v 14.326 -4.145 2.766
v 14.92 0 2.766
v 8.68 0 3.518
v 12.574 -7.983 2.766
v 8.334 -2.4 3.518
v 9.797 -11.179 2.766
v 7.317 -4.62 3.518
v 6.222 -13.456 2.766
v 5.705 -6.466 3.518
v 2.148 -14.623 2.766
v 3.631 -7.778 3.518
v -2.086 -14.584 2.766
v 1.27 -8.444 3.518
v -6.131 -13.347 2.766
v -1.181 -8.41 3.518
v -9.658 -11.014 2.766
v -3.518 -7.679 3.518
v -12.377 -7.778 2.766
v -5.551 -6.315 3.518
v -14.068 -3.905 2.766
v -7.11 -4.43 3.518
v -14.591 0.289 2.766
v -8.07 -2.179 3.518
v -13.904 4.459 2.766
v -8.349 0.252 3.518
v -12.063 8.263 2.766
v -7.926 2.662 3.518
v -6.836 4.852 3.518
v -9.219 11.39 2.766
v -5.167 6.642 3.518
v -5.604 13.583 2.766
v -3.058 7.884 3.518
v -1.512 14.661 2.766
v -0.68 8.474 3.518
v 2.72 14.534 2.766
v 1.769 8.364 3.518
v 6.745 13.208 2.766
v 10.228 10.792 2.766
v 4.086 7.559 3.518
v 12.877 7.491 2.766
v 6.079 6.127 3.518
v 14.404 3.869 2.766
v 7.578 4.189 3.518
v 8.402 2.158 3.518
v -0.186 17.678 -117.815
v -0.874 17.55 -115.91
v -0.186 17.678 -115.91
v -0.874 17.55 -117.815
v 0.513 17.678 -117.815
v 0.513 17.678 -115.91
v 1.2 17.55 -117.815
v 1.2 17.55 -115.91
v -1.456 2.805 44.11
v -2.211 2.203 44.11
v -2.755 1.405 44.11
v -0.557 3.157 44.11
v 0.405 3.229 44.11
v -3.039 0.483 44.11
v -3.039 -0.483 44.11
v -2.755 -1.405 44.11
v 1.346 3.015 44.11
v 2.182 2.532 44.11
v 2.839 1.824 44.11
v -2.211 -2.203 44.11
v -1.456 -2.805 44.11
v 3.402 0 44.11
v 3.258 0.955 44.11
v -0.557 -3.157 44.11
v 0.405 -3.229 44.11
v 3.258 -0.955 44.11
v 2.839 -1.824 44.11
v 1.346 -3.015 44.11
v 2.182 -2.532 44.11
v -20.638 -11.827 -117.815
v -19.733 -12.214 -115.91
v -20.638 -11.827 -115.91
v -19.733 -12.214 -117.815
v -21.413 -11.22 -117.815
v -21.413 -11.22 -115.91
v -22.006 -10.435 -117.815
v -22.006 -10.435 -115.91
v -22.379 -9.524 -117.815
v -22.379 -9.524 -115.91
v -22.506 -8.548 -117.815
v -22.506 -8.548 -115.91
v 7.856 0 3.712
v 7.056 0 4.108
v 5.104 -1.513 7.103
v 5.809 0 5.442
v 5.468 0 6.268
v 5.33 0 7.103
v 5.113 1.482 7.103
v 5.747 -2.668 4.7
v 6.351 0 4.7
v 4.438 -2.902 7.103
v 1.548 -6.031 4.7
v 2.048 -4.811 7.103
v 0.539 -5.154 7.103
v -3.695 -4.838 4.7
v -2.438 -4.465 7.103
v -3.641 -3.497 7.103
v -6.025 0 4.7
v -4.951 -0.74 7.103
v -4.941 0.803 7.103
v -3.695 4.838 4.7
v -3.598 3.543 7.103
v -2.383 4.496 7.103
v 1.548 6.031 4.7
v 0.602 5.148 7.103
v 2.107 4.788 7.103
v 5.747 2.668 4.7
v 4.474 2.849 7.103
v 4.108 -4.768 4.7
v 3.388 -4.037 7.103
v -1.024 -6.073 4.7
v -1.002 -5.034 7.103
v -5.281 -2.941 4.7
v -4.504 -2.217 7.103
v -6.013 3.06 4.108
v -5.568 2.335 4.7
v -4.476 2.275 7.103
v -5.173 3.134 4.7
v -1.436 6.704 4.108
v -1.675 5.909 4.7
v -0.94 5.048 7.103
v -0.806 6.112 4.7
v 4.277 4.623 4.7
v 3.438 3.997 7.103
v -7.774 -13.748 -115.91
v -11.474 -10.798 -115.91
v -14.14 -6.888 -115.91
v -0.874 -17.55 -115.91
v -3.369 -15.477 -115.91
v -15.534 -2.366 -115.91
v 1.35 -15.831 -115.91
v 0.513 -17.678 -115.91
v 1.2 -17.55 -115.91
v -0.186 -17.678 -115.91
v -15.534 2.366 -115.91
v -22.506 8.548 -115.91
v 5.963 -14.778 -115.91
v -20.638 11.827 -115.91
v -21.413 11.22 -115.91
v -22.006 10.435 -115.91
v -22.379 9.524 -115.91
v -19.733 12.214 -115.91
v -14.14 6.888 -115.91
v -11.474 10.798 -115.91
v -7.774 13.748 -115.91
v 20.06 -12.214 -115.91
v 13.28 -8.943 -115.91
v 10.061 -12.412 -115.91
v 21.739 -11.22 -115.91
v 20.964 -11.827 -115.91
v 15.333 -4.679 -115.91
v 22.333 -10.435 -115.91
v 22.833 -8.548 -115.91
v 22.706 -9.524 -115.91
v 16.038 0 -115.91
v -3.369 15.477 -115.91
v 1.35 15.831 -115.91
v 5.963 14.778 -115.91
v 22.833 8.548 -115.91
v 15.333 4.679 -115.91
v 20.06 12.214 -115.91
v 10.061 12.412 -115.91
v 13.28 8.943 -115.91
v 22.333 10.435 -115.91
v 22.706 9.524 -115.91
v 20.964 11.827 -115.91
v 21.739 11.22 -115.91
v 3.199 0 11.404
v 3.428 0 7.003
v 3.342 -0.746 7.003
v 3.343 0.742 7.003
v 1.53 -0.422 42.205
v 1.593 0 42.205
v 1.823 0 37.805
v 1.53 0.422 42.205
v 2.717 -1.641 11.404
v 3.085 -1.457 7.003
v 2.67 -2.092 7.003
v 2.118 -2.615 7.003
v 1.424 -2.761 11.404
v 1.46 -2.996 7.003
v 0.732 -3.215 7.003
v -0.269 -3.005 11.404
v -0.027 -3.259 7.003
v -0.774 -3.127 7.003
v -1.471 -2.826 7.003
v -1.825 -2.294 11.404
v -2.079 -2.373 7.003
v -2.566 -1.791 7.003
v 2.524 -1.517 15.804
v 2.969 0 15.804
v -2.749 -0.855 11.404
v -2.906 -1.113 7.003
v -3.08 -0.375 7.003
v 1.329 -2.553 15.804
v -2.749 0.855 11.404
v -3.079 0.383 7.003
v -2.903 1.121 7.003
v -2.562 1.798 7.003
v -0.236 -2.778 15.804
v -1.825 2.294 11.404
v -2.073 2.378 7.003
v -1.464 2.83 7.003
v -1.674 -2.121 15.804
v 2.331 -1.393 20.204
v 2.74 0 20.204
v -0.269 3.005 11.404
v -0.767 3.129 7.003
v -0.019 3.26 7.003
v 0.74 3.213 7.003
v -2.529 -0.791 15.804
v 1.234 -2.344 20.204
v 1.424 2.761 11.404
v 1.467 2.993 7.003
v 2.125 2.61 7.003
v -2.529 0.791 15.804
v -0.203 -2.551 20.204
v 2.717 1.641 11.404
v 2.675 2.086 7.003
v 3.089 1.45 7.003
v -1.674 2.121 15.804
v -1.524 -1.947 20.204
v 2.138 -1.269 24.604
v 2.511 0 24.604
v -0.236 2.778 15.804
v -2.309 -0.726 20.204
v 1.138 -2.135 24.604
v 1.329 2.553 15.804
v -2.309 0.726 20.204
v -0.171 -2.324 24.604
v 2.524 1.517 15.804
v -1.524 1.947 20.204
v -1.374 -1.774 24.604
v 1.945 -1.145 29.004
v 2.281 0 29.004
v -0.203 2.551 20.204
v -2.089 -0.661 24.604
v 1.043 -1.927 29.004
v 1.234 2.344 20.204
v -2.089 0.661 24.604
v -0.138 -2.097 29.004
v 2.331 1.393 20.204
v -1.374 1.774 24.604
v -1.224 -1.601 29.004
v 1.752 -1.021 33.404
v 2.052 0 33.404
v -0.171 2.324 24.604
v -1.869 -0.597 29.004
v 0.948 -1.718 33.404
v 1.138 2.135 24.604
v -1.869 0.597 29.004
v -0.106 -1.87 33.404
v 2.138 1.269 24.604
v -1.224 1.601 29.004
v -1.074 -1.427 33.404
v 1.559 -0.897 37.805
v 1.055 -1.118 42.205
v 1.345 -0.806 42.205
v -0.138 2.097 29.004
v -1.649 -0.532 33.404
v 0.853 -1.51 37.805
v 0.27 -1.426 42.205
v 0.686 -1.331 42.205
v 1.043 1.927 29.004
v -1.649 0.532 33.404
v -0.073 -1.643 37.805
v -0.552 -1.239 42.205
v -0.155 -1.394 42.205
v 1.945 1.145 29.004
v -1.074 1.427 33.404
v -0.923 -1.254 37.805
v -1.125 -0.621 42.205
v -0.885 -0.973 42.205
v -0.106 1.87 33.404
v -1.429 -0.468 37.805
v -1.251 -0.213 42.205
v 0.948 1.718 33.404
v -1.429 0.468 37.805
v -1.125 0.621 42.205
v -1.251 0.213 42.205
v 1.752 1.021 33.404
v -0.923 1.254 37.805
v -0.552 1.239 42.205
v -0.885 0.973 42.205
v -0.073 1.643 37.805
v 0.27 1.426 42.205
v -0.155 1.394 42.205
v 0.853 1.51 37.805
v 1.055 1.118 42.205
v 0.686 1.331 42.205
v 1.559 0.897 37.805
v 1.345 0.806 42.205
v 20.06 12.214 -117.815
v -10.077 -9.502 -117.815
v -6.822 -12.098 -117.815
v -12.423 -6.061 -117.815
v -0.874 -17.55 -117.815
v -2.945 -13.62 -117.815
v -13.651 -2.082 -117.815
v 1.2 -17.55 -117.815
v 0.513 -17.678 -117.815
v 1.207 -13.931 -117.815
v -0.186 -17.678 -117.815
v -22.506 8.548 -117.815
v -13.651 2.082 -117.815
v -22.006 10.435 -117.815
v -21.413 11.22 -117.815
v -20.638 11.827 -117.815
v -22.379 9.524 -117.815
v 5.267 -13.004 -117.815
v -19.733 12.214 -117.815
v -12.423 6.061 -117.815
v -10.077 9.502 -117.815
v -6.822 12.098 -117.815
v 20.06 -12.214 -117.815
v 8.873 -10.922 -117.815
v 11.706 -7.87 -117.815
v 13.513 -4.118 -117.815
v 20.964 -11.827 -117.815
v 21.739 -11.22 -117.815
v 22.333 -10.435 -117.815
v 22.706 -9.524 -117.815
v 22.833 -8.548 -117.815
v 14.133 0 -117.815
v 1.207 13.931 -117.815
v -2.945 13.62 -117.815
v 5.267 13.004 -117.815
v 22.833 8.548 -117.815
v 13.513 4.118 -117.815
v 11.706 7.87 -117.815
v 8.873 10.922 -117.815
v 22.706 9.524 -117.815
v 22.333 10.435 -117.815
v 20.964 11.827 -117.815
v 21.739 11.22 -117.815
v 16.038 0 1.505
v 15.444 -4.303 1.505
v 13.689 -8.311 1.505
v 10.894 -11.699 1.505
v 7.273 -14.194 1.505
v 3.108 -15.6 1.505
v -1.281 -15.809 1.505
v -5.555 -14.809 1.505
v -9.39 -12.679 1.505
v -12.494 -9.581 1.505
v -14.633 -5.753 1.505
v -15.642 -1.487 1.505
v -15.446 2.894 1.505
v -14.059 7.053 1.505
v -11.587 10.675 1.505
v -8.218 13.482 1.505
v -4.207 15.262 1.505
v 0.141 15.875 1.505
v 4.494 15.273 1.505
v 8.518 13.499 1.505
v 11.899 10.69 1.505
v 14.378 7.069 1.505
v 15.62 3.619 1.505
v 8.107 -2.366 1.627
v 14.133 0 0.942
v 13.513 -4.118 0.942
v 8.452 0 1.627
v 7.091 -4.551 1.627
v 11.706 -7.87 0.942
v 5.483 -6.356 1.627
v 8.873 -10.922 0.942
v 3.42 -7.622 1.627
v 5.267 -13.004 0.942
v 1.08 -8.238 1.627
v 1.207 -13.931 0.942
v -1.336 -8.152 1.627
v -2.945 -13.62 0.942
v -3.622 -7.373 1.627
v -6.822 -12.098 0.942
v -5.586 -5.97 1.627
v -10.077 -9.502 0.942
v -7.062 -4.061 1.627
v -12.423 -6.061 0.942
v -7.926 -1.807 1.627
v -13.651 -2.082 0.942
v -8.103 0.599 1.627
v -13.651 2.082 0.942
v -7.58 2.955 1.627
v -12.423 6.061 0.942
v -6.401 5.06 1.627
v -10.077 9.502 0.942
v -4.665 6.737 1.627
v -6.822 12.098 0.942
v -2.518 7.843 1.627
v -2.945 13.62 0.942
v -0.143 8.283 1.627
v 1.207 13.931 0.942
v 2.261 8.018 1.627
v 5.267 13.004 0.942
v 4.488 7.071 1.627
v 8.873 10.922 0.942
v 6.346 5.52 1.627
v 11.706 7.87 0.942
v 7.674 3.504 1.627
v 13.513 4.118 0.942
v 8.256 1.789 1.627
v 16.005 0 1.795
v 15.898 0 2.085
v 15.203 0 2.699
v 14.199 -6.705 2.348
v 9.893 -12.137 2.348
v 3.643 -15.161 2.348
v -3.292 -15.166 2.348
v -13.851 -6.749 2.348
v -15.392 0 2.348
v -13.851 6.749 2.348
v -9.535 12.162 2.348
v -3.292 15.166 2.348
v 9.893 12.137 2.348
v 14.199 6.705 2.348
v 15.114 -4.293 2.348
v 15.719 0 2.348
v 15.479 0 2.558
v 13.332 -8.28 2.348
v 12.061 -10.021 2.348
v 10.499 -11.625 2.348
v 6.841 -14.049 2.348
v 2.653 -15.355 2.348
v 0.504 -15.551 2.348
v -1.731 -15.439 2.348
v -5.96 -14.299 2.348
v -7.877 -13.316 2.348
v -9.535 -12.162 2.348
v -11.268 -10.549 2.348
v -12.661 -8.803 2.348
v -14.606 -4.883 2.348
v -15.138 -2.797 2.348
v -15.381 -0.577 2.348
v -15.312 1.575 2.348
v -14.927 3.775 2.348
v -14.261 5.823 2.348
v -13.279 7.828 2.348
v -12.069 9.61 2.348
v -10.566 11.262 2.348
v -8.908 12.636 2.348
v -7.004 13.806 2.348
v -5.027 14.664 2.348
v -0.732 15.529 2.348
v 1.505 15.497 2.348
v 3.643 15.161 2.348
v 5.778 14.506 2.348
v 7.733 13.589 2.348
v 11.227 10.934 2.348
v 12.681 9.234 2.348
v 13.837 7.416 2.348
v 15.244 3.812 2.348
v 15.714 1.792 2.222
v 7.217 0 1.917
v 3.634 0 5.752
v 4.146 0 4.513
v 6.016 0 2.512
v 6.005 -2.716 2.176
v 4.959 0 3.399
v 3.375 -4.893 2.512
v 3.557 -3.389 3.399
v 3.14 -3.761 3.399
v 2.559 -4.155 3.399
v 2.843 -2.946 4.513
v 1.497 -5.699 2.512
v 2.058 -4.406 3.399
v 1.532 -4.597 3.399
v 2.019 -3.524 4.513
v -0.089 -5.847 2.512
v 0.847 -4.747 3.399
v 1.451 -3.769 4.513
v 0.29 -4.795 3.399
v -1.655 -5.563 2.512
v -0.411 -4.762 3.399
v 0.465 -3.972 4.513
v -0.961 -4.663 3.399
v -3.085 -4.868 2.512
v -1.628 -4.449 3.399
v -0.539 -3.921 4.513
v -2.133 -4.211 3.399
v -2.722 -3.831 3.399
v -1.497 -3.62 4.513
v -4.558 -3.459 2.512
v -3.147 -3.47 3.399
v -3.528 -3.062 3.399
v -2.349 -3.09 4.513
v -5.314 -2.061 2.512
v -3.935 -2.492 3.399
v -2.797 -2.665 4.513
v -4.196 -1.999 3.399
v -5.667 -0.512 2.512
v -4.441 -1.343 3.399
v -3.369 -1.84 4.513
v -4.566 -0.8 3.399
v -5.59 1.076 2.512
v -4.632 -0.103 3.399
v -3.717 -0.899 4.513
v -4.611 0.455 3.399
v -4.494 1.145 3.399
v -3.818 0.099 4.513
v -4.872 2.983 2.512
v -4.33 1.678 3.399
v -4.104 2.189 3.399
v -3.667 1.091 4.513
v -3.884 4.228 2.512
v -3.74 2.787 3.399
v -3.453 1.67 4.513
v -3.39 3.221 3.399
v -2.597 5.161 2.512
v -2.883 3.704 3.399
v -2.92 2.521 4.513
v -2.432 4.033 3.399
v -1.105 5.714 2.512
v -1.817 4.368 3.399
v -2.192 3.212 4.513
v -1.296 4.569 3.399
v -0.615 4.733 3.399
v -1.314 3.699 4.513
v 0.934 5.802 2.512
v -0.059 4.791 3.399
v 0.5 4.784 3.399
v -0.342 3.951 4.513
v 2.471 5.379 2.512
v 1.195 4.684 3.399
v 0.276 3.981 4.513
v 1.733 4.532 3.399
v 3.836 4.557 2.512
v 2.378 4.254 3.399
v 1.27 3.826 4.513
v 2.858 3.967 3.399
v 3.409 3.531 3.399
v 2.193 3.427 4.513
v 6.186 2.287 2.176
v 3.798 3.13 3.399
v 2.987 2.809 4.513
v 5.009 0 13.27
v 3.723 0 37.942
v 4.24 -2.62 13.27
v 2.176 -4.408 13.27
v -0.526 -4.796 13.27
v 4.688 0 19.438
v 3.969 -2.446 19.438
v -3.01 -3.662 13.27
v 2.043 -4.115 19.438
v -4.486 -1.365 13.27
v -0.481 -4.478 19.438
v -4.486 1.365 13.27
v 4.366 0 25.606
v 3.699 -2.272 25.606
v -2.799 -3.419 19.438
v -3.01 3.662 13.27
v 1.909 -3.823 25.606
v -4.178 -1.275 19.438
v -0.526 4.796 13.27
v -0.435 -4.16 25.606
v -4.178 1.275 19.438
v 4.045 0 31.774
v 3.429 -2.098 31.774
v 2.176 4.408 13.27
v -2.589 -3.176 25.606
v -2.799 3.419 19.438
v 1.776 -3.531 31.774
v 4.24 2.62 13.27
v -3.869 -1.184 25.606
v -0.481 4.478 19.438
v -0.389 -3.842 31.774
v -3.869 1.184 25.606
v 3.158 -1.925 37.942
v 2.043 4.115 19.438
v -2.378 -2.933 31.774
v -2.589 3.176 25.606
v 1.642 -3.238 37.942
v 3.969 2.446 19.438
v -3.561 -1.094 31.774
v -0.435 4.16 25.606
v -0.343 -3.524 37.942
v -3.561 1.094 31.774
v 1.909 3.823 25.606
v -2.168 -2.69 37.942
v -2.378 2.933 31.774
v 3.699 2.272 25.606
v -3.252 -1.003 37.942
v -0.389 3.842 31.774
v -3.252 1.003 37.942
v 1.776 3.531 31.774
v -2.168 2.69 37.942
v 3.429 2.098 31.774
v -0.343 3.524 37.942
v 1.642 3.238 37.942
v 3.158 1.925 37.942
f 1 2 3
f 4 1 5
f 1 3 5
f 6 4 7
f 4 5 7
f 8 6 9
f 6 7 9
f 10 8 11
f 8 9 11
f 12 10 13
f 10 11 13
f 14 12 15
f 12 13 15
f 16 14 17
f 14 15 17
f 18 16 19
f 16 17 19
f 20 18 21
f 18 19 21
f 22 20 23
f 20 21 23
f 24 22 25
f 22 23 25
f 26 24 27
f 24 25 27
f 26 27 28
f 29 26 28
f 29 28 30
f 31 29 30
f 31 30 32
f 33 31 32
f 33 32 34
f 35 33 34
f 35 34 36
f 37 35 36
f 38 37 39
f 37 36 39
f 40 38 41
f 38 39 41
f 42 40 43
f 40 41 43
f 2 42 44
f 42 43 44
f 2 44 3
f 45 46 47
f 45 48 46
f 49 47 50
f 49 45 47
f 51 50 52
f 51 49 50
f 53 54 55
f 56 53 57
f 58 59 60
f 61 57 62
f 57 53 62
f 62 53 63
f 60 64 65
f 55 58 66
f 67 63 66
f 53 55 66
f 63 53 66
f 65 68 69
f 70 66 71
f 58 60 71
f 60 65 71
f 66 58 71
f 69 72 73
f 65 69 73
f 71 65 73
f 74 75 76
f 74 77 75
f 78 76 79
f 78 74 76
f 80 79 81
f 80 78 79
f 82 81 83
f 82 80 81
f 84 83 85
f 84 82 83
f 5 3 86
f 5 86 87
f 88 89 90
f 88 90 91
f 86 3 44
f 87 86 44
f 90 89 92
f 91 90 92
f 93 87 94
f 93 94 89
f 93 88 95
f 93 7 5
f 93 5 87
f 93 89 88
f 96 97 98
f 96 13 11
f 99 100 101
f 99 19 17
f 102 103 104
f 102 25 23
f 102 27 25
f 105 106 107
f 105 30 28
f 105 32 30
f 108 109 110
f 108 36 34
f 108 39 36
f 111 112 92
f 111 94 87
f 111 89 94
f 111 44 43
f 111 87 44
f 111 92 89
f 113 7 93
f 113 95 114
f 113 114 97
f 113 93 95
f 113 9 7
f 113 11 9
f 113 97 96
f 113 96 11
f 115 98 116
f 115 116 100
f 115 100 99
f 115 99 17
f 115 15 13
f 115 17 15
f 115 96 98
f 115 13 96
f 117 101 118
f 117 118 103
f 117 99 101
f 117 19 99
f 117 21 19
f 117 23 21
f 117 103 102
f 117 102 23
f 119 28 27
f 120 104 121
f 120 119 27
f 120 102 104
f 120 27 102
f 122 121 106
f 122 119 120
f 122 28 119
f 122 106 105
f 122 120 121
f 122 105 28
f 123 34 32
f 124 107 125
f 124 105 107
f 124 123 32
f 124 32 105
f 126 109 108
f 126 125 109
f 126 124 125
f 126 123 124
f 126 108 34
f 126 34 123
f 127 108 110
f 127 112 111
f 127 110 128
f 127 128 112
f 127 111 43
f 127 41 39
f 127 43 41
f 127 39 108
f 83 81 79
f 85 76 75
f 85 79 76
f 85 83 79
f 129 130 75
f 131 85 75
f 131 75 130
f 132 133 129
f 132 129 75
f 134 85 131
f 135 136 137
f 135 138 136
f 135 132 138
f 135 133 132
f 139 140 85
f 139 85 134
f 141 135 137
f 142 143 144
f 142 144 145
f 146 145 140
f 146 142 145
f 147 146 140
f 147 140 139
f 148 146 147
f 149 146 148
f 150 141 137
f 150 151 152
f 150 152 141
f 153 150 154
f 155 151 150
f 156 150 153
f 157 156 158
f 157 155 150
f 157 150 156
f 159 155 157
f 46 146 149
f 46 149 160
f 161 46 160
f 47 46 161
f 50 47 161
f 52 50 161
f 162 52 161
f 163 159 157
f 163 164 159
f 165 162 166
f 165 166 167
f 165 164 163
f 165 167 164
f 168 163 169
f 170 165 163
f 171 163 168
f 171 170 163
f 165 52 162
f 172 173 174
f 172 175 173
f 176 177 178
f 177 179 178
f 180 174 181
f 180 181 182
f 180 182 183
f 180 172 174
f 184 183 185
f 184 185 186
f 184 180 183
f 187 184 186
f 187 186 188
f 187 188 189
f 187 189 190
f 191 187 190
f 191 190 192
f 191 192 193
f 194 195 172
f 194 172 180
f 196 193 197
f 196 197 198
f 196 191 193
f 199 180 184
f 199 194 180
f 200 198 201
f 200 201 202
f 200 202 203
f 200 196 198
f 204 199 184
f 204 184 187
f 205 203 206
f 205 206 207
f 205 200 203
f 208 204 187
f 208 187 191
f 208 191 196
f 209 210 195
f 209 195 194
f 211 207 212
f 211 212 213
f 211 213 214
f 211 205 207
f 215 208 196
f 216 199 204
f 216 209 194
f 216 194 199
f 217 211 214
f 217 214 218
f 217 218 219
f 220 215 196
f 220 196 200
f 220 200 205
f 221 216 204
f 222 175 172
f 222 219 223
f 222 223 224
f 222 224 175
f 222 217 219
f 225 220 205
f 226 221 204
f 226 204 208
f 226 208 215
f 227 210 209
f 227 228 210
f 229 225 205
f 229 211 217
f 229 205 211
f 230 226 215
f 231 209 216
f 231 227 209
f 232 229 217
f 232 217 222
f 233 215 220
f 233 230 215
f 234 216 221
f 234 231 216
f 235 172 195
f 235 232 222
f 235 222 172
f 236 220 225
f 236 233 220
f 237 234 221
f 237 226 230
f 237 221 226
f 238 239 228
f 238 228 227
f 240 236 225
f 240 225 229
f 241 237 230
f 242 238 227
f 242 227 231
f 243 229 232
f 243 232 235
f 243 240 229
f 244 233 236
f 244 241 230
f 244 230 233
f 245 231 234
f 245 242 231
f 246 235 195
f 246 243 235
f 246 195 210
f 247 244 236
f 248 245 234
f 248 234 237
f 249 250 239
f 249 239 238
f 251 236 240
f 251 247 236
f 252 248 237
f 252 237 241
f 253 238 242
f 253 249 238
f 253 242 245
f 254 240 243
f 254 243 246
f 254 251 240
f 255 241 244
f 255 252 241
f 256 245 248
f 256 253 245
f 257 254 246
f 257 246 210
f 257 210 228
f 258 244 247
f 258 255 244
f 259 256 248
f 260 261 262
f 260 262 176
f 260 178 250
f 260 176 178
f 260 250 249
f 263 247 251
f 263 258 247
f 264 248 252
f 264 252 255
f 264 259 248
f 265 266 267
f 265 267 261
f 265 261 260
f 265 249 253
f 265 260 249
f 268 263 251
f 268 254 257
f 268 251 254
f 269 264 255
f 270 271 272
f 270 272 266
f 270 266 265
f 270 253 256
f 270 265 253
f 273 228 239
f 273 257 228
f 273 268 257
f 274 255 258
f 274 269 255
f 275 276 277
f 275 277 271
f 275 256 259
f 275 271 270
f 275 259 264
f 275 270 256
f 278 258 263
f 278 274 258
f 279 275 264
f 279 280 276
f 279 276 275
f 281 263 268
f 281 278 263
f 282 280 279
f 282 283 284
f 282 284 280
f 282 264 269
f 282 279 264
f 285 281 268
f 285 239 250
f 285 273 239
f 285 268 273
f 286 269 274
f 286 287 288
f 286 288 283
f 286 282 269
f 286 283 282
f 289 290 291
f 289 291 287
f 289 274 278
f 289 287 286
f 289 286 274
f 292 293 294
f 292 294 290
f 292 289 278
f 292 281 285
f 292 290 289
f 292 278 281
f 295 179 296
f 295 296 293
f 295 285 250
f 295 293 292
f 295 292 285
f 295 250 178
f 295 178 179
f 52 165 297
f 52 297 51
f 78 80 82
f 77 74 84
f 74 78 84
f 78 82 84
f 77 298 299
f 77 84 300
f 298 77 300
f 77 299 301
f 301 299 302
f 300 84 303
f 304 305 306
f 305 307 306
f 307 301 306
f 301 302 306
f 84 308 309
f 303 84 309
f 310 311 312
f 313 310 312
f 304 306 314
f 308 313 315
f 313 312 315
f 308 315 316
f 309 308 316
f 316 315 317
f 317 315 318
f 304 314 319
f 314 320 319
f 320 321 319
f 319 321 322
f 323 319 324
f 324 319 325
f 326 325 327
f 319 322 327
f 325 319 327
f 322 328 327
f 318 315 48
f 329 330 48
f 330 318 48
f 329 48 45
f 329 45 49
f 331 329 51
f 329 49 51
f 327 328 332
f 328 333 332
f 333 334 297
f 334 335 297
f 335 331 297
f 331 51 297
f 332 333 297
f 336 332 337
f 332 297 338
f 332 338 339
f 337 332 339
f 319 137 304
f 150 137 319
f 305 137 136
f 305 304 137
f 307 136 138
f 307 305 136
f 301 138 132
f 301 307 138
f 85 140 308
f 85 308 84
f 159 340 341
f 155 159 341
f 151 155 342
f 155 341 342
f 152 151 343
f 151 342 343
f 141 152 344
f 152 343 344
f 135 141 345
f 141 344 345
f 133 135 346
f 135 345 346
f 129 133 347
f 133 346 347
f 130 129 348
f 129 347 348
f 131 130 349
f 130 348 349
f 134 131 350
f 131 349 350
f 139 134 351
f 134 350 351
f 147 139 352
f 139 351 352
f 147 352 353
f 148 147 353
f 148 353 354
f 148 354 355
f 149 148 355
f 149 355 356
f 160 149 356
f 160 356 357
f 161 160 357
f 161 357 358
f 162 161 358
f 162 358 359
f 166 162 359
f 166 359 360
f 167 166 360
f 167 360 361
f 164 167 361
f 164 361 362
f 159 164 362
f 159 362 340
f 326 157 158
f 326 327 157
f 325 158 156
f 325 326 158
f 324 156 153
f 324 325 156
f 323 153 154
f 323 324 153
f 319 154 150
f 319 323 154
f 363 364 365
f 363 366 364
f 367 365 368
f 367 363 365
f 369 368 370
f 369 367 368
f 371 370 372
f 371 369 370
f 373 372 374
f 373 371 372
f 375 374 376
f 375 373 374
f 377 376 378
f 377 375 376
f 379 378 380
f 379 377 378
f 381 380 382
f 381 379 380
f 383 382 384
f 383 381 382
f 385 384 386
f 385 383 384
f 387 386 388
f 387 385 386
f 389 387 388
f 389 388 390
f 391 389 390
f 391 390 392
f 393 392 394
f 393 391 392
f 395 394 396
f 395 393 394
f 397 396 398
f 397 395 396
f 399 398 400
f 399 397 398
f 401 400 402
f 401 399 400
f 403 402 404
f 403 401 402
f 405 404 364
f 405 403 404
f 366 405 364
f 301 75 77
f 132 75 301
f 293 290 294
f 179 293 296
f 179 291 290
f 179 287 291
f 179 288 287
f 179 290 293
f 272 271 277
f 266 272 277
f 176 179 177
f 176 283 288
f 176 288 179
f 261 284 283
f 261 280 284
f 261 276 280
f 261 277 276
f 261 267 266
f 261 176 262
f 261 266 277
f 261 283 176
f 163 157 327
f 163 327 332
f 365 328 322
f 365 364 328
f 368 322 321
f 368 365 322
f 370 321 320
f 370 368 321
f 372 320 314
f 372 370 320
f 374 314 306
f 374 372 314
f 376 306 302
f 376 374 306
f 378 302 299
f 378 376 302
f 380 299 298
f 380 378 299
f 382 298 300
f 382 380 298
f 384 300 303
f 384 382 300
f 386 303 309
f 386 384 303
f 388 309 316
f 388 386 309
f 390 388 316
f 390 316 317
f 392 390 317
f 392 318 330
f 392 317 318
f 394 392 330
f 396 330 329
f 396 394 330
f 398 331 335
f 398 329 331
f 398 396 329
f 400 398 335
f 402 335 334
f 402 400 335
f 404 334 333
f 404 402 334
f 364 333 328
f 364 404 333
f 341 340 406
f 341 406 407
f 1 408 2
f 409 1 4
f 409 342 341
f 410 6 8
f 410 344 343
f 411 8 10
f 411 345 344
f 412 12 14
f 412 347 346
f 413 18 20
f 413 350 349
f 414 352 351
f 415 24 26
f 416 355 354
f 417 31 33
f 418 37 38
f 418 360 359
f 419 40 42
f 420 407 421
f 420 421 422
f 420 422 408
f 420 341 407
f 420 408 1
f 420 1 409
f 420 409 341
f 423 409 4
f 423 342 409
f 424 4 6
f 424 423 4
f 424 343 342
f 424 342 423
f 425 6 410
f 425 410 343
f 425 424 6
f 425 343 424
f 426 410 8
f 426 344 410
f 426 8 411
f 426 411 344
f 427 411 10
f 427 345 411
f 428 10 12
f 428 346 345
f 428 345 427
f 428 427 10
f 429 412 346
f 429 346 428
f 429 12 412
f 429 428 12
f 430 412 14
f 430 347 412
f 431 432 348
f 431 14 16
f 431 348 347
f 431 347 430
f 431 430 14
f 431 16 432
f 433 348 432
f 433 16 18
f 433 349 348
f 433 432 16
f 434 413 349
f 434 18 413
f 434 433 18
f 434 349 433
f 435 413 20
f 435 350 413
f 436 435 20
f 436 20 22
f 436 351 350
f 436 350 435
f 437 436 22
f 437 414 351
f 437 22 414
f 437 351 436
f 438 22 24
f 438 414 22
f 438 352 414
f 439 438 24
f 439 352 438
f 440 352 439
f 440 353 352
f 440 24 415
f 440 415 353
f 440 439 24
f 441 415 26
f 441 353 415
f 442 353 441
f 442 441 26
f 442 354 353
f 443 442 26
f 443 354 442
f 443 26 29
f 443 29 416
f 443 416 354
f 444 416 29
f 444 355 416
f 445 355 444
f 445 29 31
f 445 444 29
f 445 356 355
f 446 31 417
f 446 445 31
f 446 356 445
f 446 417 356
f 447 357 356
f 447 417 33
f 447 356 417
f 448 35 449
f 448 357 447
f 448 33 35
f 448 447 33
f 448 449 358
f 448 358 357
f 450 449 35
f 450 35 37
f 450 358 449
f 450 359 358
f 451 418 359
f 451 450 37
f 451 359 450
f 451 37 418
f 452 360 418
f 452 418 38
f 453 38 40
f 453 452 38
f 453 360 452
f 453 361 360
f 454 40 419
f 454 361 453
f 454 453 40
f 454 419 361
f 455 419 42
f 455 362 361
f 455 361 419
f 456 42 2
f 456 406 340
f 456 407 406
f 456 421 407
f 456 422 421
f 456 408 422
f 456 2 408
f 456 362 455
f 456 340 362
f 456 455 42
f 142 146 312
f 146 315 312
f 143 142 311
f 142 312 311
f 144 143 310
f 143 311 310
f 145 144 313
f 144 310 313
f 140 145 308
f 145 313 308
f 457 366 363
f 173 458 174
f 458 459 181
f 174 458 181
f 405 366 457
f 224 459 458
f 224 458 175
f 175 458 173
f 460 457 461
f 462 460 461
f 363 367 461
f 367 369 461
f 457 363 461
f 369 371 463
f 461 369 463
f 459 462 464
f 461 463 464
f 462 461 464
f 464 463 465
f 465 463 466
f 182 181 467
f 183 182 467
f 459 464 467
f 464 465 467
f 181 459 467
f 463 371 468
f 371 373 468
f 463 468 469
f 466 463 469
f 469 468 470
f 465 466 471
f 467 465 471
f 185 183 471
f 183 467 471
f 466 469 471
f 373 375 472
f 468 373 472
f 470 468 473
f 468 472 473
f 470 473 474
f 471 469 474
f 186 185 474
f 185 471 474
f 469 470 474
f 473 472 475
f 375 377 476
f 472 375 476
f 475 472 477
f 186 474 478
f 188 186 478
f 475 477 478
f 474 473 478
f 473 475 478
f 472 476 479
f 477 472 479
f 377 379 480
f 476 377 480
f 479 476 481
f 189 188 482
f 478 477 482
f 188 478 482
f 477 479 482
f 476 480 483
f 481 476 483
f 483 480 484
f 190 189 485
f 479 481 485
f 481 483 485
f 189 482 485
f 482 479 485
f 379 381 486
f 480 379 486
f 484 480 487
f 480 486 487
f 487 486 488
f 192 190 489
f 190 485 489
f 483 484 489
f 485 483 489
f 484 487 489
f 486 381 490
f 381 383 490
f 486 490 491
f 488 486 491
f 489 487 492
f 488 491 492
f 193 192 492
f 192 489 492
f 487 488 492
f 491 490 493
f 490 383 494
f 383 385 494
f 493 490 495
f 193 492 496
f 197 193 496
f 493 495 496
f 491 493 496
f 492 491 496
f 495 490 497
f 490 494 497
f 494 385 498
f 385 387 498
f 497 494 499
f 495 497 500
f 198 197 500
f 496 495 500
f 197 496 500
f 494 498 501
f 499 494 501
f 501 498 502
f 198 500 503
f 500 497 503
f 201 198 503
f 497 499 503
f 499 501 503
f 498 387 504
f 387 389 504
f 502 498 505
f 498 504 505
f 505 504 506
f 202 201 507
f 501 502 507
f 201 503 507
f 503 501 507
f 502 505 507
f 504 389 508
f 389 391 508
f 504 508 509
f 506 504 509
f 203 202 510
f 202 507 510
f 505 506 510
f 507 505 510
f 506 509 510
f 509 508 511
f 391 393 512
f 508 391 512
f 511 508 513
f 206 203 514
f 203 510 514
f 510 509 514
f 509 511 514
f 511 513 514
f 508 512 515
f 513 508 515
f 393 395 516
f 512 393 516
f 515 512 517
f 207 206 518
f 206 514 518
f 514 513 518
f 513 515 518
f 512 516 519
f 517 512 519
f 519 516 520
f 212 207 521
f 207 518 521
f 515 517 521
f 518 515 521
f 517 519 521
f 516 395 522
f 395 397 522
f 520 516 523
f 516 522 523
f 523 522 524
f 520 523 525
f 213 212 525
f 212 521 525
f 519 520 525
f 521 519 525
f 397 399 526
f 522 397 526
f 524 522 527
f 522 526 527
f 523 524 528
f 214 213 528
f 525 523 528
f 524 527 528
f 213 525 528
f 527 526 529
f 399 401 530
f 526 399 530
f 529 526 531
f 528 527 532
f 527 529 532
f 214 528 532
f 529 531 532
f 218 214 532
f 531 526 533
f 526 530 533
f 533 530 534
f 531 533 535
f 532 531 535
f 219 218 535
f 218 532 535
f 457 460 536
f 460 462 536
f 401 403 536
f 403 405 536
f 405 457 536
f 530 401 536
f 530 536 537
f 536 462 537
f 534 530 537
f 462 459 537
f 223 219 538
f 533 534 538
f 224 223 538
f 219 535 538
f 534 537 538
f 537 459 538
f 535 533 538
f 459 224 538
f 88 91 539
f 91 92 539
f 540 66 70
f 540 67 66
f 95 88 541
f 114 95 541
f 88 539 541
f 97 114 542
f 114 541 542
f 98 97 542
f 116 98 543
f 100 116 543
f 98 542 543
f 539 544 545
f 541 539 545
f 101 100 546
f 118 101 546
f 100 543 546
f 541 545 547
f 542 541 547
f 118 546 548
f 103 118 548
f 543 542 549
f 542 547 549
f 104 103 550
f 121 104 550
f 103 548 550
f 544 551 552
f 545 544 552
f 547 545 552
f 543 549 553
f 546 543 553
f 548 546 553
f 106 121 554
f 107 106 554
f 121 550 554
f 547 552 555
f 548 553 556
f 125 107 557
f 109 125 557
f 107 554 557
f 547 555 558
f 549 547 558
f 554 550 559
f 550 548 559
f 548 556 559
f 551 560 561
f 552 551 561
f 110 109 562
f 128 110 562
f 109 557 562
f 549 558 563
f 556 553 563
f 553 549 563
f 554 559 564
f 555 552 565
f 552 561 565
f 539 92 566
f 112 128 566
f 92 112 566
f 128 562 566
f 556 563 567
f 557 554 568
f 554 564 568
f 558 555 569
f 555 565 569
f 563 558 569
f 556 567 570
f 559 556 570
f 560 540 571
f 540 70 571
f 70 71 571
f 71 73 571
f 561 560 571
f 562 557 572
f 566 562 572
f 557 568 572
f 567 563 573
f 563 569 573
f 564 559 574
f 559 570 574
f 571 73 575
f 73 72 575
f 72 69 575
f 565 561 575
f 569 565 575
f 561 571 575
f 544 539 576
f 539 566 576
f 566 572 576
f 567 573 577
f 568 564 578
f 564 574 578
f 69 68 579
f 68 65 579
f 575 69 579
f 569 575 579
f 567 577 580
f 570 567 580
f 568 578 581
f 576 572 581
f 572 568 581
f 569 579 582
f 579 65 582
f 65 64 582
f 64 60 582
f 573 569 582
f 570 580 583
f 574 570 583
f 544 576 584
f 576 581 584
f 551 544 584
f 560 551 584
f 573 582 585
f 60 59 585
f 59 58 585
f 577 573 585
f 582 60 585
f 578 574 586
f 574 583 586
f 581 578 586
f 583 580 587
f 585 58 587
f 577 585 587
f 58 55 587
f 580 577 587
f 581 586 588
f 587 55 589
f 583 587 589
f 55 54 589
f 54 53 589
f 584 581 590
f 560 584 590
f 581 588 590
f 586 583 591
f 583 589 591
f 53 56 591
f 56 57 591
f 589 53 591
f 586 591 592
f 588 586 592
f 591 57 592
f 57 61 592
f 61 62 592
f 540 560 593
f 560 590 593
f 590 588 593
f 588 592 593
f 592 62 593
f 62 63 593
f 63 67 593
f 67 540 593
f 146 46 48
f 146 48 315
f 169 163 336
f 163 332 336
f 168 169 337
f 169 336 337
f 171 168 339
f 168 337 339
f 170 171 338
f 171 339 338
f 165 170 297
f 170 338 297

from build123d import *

# Parameters (mm, degrees)
FILLET1_R           = 3.81
SHELL1_T            = -1.905
BOSS_EXTRUDE1_START = -1.905
SKETCH2_R           = 15.875
BOSS_EXTRUDE1_DEPTH = 1.905
FILLET2_R           = 3.81
FILLET3_R           = 1.27


with BuildPart() as part:
    # Sketch1 → Revolve1 (revolve)
    with BuildSketch(Plane(origin=(0, 0, 0), x_dir=(1, 0, 0), z_dir=(0, 1, 0))):
        Polygon((16.038285714, 117.815178571), (16.038285714, -2.631621429), (5.497285714, -3.901621429), (3.401785714, -44.109821429), (0.163285714, -44.109821429), (0.163285714, 117.815178571), align=None)
    revolve(axis=Axis((0.163285714, 0, 44.109821429), (0, 0, -1)))

    # Fillet1
    fillet1_edges = [part.edges().sort_by_distance(p)[0] for p in [
        (-5.170714286, 0, 3.901621429),
    ]]
    fillet(fillet1_edges, radius=FILLET1_R)

    # Shell1
    shell1_openings = [part.faces().sort_by_distance(p)[0] for p in [
        (0.163285714, 0, -117.815178571),
    ]]
    offset(amount=SHELL1_T, openings=shell1_openings, kind=Kind.INTERSECTION)

    # Sketch2 → Boss-Extrude1 (add)
    with BuildSketch(Plane(origin=(0, 0, -117.815178571), x_dir=(-1, 0, 0), z_dir=(0, 0, -1)).offset(BOSS_EXTRUDE1_START)):
        Polygon((-0.163285714, 17.8435), (22.506214286, 11.43), (22.506214286, -11.43), (-0.163285714, -17.8435), (-22.832785714, -11.43), (-22.832785714, 11.43), align=None)
        with Locations((-0.163285714, 0)):
            Circle(SKETCH2_R, mode=Mode.SUBTRACT)
    extrude(amount=BOSS_EXTRUDE1_DEPTH)

    # Fillet2
    fillet2_edges = [part.edges().sort_by_distance(p)[0] for p in [
        (0.163285714, 17.8435, -116.862678571),
        (-22.506214286, 11.43, -116.862678571),
        (-22.506214286, -11.43, -116.862678571),
        (0.163285714, -17.8435, -116.862678571),
        (22.832785714, -11.43, -116.862678571),
        (22.832785714, 11.43, -116.862678571),
    ]]
    fillet(fillet2_edges, radius=FILLET2_R)

    # Fillet3
    fillet3_edges = [part.edges().sort_by_distance(p)[0] for p in [
        (-15.711714286, 0, 2.631621429),
    ]]
    fillet(fillet3_edges, radius=FILLET3_R)


solid = part.part
